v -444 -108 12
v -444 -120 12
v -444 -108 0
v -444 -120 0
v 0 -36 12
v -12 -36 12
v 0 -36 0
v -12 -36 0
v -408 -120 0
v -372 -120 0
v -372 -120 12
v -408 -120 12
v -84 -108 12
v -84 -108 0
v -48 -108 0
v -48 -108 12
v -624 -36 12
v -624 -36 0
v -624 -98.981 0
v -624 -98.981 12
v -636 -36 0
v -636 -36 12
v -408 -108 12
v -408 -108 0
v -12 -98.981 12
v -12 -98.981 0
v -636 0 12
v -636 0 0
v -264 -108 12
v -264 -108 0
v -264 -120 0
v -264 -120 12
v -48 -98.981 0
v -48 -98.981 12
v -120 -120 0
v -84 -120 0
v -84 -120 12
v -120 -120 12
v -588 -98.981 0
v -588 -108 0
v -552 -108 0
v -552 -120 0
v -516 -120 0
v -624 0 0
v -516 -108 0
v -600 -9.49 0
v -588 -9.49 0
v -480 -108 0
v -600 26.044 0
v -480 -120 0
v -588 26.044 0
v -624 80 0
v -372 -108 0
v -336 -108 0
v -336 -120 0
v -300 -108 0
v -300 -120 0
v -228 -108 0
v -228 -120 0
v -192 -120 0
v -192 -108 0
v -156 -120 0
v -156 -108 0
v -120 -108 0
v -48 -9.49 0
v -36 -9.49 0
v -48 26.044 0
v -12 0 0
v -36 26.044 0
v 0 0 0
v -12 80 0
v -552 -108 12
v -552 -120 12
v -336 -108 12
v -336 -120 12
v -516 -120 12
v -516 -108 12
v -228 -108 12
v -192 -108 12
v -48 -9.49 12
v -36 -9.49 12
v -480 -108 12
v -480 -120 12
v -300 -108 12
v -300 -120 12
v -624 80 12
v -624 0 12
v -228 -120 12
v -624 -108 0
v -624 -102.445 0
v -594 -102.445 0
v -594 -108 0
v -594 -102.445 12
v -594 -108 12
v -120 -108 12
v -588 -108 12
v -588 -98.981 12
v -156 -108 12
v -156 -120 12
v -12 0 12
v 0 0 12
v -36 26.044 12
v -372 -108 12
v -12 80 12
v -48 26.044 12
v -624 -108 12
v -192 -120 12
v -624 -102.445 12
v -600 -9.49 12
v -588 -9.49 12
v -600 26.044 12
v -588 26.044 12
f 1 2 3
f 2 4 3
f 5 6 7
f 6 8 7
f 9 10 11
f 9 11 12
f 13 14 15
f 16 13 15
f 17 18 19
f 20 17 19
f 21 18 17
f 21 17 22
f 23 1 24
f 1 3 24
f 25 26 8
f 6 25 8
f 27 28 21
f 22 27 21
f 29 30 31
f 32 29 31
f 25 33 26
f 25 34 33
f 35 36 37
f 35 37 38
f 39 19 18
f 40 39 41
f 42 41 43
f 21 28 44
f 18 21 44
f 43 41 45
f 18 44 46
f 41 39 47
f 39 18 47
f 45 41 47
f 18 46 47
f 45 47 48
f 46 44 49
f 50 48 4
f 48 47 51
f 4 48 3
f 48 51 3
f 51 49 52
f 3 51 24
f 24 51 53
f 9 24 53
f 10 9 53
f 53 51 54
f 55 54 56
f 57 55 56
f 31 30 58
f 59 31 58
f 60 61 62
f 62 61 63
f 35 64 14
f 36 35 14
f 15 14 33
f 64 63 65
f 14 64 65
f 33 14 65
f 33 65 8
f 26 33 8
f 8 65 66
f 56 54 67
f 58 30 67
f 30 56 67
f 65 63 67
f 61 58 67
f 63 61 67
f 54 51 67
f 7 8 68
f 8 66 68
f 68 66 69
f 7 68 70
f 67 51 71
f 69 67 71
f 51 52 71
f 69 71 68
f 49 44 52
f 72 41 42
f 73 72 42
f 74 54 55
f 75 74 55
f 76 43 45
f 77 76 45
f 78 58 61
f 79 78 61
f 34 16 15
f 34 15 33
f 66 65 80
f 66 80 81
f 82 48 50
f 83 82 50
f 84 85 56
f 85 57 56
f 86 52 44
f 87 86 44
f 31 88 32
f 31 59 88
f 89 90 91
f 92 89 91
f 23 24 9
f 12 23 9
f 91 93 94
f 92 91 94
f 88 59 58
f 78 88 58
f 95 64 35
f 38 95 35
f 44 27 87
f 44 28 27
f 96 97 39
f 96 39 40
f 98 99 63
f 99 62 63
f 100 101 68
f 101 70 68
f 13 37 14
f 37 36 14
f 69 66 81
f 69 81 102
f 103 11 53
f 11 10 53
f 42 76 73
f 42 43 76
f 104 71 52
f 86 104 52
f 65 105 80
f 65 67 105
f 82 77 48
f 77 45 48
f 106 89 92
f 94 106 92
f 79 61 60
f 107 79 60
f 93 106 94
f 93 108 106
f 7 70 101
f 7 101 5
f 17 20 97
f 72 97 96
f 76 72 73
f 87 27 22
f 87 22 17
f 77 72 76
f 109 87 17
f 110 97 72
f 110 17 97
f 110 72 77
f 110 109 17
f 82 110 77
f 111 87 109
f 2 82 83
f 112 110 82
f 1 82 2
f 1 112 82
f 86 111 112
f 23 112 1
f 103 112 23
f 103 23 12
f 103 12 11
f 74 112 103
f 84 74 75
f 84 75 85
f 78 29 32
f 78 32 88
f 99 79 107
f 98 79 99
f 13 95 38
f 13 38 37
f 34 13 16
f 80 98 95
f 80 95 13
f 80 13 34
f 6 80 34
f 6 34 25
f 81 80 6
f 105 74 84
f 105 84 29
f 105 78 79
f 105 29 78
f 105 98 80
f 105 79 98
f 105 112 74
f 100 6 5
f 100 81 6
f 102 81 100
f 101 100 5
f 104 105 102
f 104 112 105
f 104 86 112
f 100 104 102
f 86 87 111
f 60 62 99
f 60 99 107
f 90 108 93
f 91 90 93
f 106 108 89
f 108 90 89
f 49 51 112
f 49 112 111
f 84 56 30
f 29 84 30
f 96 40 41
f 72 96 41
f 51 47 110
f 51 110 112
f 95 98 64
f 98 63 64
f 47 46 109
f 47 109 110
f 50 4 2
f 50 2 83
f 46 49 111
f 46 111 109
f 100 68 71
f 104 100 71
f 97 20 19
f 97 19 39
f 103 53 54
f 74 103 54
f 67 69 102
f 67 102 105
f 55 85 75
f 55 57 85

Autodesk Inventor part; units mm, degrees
ref_plane "YZ Plane" through (0, 0, 0) normal (1, 0, 0) x (0, 1, 0)
ref_plane "XZ Plane" through (0, 0, 0) normal (0, 1, 0) x (-1, 0, 0)
ref_plane "XY Plane" through (0, 0, 0) normal (0, 0, 1) x (1, 0, 0)
ref_plane "Work Plane1" through (0, 0, 0) normal (0, 0, 1) x (1, 0, 0)
ref_plane "Work Plane2" through (0, 0, 0) normal (0, 0, 1) x (1, 0, 0)
ref_plane "Work Plane3" through (0, -36, 12) normal (0, 0, -1) x (-1, 0, 0)
ref_plane "Work Plane4" through (0, 0, 0) normal (0, 0, 1) x (1, 0, 0)
sketch "Sketch2" plane through (0, 0, 0) normal (0, 0, 1) x (1, 0, 0)
  line L0 (0, -120) -> (-12, -120)
  line L1 (-12, -120) -> (-12, -36)
  line L2 (-12, -36) -> (0, -36)
  line L3 (0, 0) -> (0, -36)
  line L4 (0, 0) -> (-12, 0)
  line L5 (-12, 0) -> (-12, 102.2276)
  line L6 (-12, 102.2276) -> (0, 102.2276)
  line L7 (0, 102.2276) -> (0, 0)
  line L8 (0, -36) -> (0, -120)
  line L9 (-12, -36) -> (-12, 0)
  line L10 (-12, -112.5877) -> (-42, -112.5877)
  line L11 (-42, -112.5877) -> (-42, -108)
  line L12 (-48, -108) -> (-42, -108)
  line L13 (-84, -108) -> (-48, -108)
  line L14 (-120, -108) -> (-84, -108)
  line L15 (-156, -108) -> (-120, -108)
  line L16 (-192, -108) -> (-156, -108)
  line L17 (-228, -108) -> (-192, -108)
  line L18 (-264, -108) -> (-228, -108)
  line L19 (-300, -108) -> (-264, -108)
  line L20 (-336, -108) -> (-300, -108)
  line L21 (-372, -108) -> (-336, -108)
  line L22 (-408, -108) -> (-372, -108)
  line L23 (-444, -108) -> (-408, -108)
  line L24 (-480, -108) -> (-444, -108)
  line L25 (-516, -108) -> (-480, -108)
  line L26 (-552, -108) -> (-516, -108)
  line L27 (-588, -108) -> (-552, -108)
  line L28 (-624, -108) -> (-588, -108)
  line L29 (-624, -120) -> (-624, -108)
  line L30 (-588, -120) -> (-624, -120)
  line L31 (-588, -120) -> (-588, -108)
  line L32 (-12, -112.5877) -> (-12, -120)
  line L33 (-12, -102.4451) -> (-12, -112.5877)
  line L34 (-42, -102.4451) -> (-12, -102.4451)
  line L35 (-42, -108) -> (-42, -102.4451)
  line L36 (-48, -108) -> (-48, -120)
  line L37 (-12, -120) -> (-48, -120)
  line L38 (-84, -120) -> (-84, -108)
  line L39 (-48, -120) -> (-84, -120)
  line L40 (-120, -108) -> (-120, -120)
  line L41 (-84, -120) -> (-120, -120)
  line L42 (-156, -120) -> (-156, -108)
  line L43 (-120, -120) -> (-156, -120)
  line L44 (-192, -108) -> (-192, -120)
  line L45 (-156, -120) -> (-192, -120)
  line L46 (-228, -120) -> (-228, -108)
  line L47 (-192, -120) -> (-228, -120)
  line L48 (-264, -108) -> (-264, -120)
  line L49 (-228, -120) -> (-264, -120)
  line L50 (-300, -120) -> (-300, -108)
  line L51 (-264, -120) -> (-300, -120)
  line L52 (-336, -108) -> (-336, -120)
  line L53 (-300, -120) -> (-336, -120)
  line L54 (-372, -120) -> (-372, -108)
  line L55 (-336, -120) -> (-372, -120)
  line L56 (-408, -108) -> (-408, -120)
  line L57 (-372, -120) -> (-408, -120)
  line L58 (-444, -120) -> (-444, -108)
  line L59 (-408, -120) -> (-444, -120)
  line L60 (-480, -108) -> (-480, -120)
  line L61 (-444, -120) -> (-480, -120)
  line L62 (-516, -120) -> (-516, -108)
  line L63 (-480, -120) -> (-516, -120)
  line L64 (-552, -108) -> (-552, -120)
  line L65 (-516, -120) -> (-552, -120)
  line L66 (-552, -120) -> (-588, -120)
  line L67 (-624, -108) -> (-12, -108)
  line L68 (-12, -108) -> (-12, 80)
  line L69 (-12, 80) -> (-624, 80)
  line L70 (-624, 80) -> (-624, -108)
  line L71 (-624, 80) -> (-12, 80) projected
  line L72 (-318, 80) -> (-318, -65.4515) construction
  line L73 (-624, -36) -> (-636, -36)
  line L74 (-636, 0) -> (-636, -36)
  line L75 (-636, 0) -> (-624, 0)
  line L76 (-624, -36) -> (-624, 0)
  dimension "d0" = 306
  dimension "d1" = 306
extrude "Extrusion1" add sketch "Sketch2" along normal blind 12 contours L2 L9 L4 L3 | L1 L34 L35 L12 L13 L14 L15 L16 L17 L18 L19 L20 L21 L22 L23 L24 L25 L26 L27 L28 L70 L69 L5 L9 | L41 L40 L14 L38 | L45 L44 L16 L42 | L70 L73 L74 L75 | L49 L48 L18 L46 | L53 L52 L20 L50 | L26 L62 L65 L64 | L57 L56 L22 L54 | L24 L58 L61 L60
sketch "Sketch4" plane through (0, 0, 12) normal (0, 0, 1) x (1, 0, 0)
  line L0 (-48, -98.9808) -> (-12, -98.9808) projected
  line L1 (-48, -204.6359) -> (-48, -98.9808) projected
  line L2 (-12, 80) -> (-624, 80) projected
  line L3 (-624, 80) -> (-624, 0) projected
  line L4 (-624, 0) -> (-636, 0) projected
  line L5 (-636, 0) -> (-636, -36) projected
  line L6 (-636, -36) -> (-624, -36) projected
  line L7 (-624, -36) -> (-624, -108) projected
  line L8 (-624, -108) -> (-552, -108) projected
  line L9 (-552, -108) -> (-552, -120) projected
  line L10 (-552, -120) -> (-516, -120) projected
  line L11 (-516, -120) -> (-516, -108) projected
  line L12 (-516, -108) -> (-480, -108) projected
  line L13 (-480, -108) -> (-480, -120) projected
  line L14 (-480, -120) -> (-444, -120) projected
  line L15 (-444, -120) -> (-444, -108) projected
  line L16 (-444, -108) -> (-408, -108) projected
  line L17 (-408, -108) -> (-408, -120) projected
  line L18 (-408, -120) -> (-372, -120) projected
  line L19 (-372, -120) -> (-372, -108) projected
  line L20 (-372, -108) -> (-336, -108) projected
  line L21 (-336, -108) -> (-336, -120) projected
  line L22 (-336, -120) -> (-300, -120) projected
  line L23 (-300, -120) -> (-300, -108) projected
  line L24 (-300, -108) -> (-264, -108) projected
  line L25 (-264, -108) -> (-264, -120) projected
  line L26 (-264, -120) -> (-228, -120) projected
  line L27 (-228, -120) -> (-228, -108) projected
  line L28 (-228, -108) -> (-192, -108) projected
  line L29 (-192, -108) -> (-192, -120) projected
  line L30 (-192, -120) -> (-156, -120) projected
  line L31 (-156, -120) -> (-156, -108) projected
  line L32 (-156, -108) -> (-120, -108) projected
  line L33 (-120, -108) -> (-120, -120) projected
  line L34 (-120, -120) -> (-84, -120) projected
  line L35 (-84, -120) -> (-84, -108) projected
  line L36 (-84, -108) -> (-42, -108) projected
  line L37 (-42, -108) -> (-42, -102.4451) projected
  line L38 (-42, -102.4451) -> (-12, -102.4451) projected
  line L39 (-12, -102.4451) -> (-12, -36) projected
  line L40 (-12, -36) -> (0, -36) projected
  line L41 (0, -36) -> (0, 0) projected
  line L42 (0, 0) -> (-12, 0) projected
  line L43 (-12, 0) -> (-12, 80) projected
  point P0 (-48, -108)
  point P1 (-12.9115, -102.4451)
extrude "Extrusion2" cut sketch "Sketch4" against normal blind 12 contours L0 L39 L38 L37 L36 L1
ref_plane "Work Plane5" through (-318, -36, 0) normal (-1, 0, 0) x (0, 0, 1)
mirror "Mirror1" about plane through (-318, -36, 0) normal (-1, 0, 0) of "Extrusion2"
sketch "Sketch7" plane through (0, 0, 0) normal (0, 0, -1) x (-1, 0, 0)
  line L0 (48, -9.4904) -> (36, -9.4904)
  line L1 (36, -9.4904) -> (36, 26.0445)
  line L2 (36, 26.0445) -> (48, 26.0445)
  line L3 (48, 26.0445) -> (48, -9.4904)
  point P0 (0, 0)
extrude "Extrusion3" cut sketch "Sketch7" against normal through all
mirror "Mirror2" about plane through (-318, -36, 0) normal (-1, 0, 0) of "Extrusion3"
sketch "Sketch8" plane through (0, 0, 12) normal (0, 0, 1) x (1, 0, 0)
  line L0 (-600, -9.4904) -> (-600, 26.0445) projected
  line L1 (-600, 26.0445) -> (-588, 26.0445) projected
  line L2 (-588, 26.0445) -> (-588, -9.4904) projected
  line L3 (-588, -9.4904) -> (-600, -9.4904) projected
  line L4 (-48, -9.4904) -> (-48, 26.0445) projected
  line L5 (-48, 26.0445) -> (-36, 26.0445) projected
  line L6 (-36, 26.0445) -> (-36, -9.4904) projected
  line L7 (-36, -9.4904) -> (-48, -9.4904) projected
  line L8 (-588, -98.9808) -> (-588, -108) projected
  line L9 (-588, -108) -> (-552, -108) projected
  line L10 (-552, -108) -> (-552, -120) projected
  line L11 (-552, -120) -> (-516, -120) projected
  line L12 (-516, -120) -> (-516, -108) projected
  line L13 (-516, -108) -> (-480, -108) projected
  line L14 (-480, -108) -> (-480, -120) projected
  line L15 (-480, -120) -> (-444, -120) projected
  line L16 (-444, -120) -> (-444, -108) projected
  line L17 (-444, -108) -> (-408, -108) projected
  line L18 (-408, -108) -> (-408, -120) projected
  line L19 (-408, -120) -> (-372, -120) projected
  line L20 (-372, -120) -> (-372, -108) projected
  line L21 (-372, -108) -> (-336, -108) projected
  line L22 (-336, -108) -> (-336, -120) projected
  line L23 (-336, -120) -> (-300, -120) projected
  line L24 (-300, -120) -> (-300, -108) projected
  line L25 (-300, -108) -> (-264, -108) projected
  line L26 (-264, -108) -> (-264, -120) projected
  line L27 (-264, -120) -> (-228, -120) projected
  line L28 (-228, -120) -> (-228, -108) projected
  line L29 (-228, -108) -> (-192, -108) projected
  line L30 (-192, -108) -> (-192, -120) projected
  line L31 (-192, -120) -> (-156, -120) projected
  line L32 (-156, -120) -> (-156, -108) projected
  line L33 (-156, -108) -> (-120, -108) projected
  line L34 (-120, -108) -> (-120, -120) projected
  line L35 (-120, -120) -> (-84, -120) projected
  line L36 (-84, -120) -> (-84, -108) projected
  line L37 (-84, -108) -> (-48, -108) projected
  line L38 (-48, -108) -> (-48, -98.9808) projected
  line L39 (-48, -98.9808) -> (-12, -98.9808) projected
  line L40 (-12, -98.9808) -> (-12, -36) projected
  line L41 (-12, -36) -> (0, -36) projected
  line L42 (0, -36) -> (0, 0) projected
  line L43 (0, 0) -> (-12, 0) projected
  line L44 (-12, 0) -> (-12, 80) projected
  line L45 (-12, 80) -> (-624, 80) projected
  line L46 (-624, 80) -> (-624, 0) projected
  line L47 (-624, 0) -> (-636, 0) projected
  line L48 (-636, 0) -> (-636, -36) projected
  line L49 (-636, -36) -> (-624, -36) projected
  line L50 (-624, -36) -> (-624, -98.9808) projected
  line L51 (-624, -98.9808) -> (-588, -98.9808) projected
equation "\"d0\" = d1"
properties part number "wooden_bottom"
